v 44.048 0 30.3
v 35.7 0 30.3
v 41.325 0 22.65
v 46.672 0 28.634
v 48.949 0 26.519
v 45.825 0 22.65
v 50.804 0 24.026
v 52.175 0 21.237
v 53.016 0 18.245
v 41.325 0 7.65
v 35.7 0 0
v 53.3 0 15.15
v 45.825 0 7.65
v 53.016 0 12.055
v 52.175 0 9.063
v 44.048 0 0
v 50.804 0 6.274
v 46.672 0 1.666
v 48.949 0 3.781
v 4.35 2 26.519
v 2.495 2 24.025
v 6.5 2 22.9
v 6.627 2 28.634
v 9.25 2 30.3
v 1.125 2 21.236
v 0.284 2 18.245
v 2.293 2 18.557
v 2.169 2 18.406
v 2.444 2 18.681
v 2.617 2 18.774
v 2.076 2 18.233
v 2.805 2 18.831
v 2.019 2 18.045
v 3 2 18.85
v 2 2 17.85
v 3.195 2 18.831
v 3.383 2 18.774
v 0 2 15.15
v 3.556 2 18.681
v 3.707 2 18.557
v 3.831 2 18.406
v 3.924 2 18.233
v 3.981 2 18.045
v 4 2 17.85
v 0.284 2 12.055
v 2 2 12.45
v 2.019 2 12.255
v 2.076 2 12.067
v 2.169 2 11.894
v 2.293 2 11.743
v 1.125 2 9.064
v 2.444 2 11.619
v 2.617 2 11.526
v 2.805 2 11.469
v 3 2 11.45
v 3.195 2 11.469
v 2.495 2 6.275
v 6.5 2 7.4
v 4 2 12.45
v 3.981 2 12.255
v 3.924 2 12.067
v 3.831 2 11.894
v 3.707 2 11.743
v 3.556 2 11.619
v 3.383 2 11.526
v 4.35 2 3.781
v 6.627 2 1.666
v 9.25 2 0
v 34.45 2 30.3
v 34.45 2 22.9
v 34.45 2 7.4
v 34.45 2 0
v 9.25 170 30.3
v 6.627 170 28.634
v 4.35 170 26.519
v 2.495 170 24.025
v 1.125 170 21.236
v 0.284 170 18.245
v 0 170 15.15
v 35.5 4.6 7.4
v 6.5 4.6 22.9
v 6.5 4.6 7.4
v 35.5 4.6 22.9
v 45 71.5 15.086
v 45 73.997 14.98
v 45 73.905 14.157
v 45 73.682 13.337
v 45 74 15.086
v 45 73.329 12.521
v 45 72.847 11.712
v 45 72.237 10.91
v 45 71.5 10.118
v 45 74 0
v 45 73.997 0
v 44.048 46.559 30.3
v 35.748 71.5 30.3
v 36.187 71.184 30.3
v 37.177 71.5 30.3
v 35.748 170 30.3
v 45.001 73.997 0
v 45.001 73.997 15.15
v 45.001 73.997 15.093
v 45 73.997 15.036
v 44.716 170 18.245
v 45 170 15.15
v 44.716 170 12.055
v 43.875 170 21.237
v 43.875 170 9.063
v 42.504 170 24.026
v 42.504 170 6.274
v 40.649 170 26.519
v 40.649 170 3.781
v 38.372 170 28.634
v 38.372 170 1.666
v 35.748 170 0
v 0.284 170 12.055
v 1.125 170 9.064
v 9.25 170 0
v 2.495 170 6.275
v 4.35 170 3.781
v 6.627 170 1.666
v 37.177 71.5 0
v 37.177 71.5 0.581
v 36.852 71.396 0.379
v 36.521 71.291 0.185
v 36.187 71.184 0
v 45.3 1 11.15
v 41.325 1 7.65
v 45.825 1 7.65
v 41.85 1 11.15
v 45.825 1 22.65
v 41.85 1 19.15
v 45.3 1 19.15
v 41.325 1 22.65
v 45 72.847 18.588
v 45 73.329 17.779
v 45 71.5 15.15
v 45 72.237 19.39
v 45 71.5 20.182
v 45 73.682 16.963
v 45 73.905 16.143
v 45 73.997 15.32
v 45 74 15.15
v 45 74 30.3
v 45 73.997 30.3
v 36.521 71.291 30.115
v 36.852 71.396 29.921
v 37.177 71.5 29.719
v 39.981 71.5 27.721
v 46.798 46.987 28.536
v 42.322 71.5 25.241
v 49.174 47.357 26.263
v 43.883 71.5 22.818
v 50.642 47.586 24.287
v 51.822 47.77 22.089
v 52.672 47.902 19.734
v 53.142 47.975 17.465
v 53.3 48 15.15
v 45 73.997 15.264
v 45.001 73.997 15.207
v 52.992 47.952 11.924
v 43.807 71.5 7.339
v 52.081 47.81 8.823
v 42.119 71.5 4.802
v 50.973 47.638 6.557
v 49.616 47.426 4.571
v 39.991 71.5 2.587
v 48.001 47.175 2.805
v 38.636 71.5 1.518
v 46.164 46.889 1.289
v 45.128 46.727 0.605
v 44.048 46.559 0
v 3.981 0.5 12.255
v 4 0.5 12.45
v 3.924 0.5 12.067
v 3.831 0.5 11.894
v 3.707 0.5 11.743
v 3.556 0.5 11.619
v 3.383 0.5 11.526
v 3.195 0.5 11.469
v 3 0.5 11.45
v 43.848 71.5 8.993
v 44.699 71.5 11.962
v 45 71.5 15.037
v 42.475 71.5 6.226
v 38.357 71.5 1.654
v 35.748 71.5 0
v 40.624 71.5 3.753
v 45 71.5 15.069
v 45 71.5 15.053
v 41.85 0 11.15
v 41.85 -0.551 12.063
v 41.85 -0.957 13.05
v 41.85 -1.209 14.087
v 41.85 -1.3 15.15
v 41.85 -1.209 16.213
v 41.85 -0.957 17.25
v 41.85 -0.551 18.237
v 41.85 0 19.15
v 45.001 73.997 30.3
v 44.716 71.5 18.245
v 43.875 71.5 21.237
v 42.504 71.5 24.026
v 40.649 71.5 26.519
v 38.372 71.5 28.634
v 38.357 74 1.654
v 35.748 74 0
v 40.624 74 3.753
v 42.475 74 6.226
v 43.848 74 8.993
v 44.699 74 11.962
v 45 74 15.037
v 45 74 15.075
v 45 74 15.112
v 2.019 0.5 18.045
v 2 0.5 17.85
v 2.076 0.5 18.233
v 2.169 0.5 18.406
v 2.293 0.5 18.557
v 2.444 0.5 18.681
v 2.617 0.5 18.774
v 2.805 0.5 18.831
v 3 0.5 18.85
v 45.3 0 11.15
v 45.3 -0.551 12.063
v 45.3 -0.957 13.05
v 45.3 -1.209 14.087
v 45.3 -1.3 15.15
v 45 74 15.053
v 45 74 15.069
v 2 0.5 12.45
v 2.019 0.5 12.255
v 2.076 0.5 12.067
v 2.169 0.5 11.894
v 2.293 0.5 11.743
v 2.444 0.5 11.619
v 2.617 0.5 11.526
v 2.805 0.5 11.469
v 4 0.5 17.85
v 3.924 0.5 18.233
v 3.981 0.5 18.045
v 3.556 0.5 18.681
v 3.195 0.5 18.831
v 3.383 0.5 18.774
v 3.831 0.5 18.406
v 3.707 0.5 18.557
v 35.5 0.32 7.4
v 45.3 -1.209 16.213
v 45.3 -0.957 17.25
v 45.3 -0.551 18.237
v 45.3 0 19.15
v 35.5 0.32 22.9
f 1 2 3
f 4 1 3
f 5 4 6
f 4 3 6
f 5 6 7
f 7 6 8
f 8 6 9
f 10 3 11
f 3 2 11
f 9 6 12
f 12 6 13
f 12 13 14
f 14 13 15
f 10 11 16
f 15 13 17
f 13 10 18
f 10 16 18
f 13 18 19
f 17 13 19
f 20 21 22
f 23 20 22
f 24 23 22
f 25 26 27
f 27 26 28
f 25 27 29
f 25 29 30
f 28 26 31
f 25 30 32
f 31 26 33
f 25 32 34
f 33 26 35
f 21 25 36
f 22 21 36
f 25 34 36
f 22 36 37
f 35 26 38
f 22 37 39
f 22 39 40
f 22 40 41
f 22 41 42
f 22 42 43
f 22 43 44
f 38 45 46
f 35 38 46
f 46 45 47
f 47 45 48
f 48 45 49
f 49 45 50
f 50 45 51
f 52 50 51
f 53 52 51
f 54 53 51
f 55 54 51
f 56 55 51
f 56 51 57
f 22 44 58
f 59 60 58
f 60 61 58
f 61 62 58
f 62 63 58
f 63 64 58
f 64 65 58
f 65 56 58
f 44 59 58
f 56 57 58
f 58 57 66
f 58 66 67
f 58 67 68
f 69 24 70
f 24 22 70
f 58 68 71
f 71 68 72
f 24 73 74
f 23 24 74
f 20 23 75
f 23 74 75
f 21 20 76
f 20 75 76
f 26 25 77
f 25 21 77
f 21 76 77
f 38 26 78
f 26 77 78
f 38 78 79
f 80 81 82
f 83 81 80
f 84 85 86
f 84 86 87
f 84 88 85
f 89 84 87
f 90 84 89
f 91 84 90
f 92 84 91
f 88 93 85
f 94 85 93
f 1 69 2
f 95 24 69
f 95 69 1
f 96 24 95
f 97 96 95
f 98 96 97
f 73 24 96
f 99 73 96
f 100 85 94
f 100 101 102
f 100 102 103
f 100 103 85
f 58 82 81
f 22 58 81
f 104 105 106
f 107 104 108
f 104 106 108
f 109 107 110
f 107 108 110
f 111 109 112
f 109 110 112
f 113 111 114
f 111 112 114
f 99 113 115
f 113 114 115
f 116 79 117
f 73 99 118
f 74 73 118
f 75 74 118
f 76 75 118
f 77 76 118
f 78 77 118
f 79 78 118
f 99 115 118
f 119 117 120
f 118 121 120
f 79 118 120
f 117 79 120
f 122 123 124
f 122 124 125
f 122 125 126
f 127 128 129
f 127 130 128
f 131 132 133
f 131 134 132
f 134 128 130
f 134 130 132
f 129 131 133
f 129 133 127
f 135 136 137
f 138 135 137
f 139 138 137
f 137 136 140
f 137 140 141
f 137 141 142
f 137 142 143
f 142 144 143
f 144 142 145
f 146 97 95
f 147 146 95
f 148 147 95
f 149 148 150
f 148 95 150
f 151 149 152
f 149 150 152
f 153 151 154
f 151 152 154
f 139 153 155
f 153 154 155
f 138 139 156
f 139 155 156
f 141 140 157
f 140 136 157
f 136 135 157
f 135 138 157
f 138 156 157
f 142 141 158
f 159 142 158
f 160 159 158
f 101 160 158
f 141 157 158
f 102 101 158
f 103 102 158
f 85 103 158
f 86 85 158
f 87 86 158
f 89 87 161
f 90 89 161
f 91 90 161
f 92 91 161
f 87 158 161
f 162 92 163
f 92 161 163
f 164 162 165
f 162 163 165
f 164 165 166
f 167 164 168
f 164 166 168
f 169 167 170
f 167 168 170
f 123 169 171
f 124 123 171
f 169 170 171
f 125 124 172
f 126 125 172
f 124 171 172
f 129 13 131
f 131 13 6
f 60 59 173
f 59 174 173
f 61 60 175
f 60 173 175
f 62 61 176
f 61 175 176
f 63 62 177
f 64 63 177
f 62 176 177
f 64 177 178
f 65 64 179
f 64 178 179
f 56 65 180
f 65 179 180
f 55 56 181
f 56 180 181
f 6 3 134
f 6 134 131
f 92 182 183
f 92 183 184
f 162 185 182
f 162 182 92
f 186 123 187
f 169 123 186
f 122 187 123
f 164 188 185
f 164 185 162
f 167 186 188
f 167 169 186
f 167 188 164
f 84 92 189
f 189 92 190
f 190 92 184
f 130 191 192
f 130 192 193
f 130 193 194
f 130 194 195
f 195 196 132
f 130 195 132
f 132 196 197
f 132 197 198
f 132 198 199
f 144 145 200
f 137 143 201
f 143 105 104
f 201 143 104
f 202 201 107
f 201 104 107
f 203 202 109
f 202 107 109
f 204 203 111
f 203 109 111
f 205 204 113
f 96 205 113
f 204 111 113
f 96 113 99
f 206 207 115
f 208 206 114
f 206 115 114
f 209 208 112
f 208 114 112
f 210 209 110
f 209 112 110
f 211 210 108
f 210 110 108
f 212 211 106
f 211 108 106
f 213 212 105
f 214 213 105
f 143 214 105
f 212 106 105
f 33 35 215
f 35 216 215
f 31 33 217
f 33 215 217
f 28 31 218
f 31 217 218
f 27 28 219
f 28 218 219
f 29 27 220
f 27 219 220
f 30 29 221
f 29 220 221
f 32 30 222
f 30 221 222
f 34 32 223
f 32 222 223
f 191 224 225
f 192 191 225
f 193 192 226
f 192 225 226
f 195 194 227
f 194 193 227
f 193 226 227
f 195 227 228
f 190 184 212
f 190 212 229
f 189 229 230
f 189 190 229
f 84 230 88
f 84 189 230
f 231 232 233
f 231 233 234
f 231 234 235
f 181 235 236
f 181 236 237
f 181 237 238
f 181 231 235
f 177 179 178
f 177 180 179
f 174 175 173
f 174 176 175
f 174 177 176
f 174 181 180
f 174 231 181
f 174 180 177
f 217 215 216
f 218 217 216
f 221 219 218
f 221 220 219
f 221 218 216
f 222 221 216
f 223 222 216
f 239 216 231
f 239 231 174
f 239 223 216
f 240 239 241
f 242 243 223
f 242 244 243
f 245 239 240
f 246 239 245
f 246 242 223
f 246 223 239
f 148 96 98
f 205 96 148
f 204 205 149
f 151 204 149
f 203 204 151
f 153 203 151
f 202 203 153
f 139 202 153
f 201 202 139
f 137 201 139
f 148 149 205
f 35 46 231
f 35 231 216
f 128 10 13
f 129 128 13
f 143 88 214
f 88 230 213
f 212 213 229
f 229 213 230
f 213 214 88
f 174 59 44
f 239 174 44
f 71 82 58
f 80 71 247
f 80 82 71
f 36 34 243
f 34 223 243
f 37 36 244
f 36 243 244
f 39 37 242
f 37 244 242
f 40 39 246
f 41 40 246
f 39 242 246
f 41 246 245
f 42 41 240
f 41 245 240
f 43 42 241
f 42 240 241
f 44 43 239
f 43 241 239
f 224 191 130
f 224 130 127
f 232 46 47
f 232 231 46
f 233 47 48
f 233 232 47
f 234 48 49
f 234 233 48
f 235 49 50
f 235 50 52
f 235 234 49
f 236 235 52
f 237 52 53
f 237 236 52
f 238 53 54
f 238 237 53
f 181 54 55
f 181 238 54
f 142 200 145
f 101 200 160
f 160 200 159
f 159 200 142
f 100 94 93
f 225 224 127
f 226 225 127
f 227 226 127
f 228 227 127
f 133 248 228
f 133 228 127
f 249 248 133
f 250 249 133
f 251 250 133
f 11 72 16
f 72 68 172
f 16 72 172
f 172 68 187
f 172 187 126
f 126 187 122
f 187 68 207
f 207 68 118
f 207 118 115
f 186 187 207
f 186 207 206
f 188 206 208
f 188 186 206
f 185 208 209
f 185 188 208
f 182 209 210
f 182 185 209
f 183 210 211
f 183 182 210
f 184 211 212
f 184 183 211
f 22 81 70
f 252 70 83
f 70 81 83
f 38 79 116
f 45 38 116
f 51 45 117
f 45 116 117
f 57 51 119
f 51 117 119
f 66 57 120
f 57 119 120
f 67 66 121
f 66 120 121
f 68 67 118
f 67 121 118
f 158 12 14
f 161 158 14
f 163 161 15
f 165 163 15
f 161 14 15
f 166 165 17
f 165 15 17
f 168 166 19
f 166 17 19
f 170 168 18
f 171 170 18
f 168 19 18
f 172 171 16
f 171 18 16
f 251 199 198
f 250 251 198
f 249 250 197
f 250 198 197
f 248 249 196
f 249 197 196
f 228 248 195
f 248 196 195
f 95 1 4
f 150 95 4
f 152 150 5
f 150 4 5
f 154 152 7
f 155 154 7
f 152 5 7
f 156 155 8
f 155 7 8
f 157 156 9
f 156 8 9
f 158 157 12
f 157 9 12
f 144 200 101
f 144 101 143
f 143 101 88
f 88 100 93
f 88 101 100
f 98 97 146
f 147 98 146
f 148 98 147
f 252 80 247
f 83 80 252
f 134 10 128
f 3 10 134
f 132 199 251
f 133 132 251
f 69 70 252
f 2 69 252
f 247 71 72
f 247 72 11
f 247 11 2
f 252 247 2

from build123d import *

# Parameters (mm, degrees)
BOSS_EXTRUDE1_DEPTH      = 30.3
CUT_EXTRUDE1_DEPTH       = 181.717957049
CUT_EXTRUDE7_DEPTH       = 27.29
CUT_EXTRUDE10_DEPTH      = 96
CUT_EXTRUDE11_DEPTH      = 48
SKETCH9_W                = 2
SKETCH9_H                = 7.4
BOSS_EXTRUDE2_DEPTH      = 1.5
FILLET8_R                = 1
CUT_EXTRUDE15_DEPTH      = 2.6
CUT_EXTRUDE15_DEPTH_BACK = 2.6
SKETCH10_W               = 29
SKETCH10_H               = 15.5
SKETCH11_W               = 3.45
SKETCH11_H               = 8
BOSS_EXTRUDE3_DEPTH      = 1.3
FILLET9_R                = 7
CUT_EXTRUDE18_DEPTH      = 2.5
CUT_EXTRUDE23_START      = -2.5
CUT_EXTRUDE23_DEPTH      = 2.5
SKETCH18_W               = 4.5
SKETCH18_H               = 15
SKETCH18_W_2             = 3.45
SKETCH18_H_2             = 8
CUT_EXTRUDE24_DEPTH      = 1


# Read off the part's stored shape, not the designer's step: Cut-Extrude23
# Some blends are built 0.0001 mm under size
with BuildPart() as part:
    # Sketch1 → Boss-Extrude1 (new body)
    with BuildSketch(Plane.XY):
        Polygon((34.45, 2), (35.7, 0), (53.3, 0), (53.3, 48), (45, 74), (45, 170), (0, 170), (0, 2), align=None)
    extrude(amount=BOSS_EXTRUDE1_DEPTH)

    # Sketch2 → Cut-Extrude1 (cut, through all)
    with BuildSketch(Plane(origin=(0, 170, 0), x_dir=(1, 0, 0), z_dir=(0, 1, 0))):
        with BuildLine():
            Line((0, -30.3), (9.25, -30.3))
            ThreePointArc((9.25, -30.3), (2.495291793, -24.025316905), (0, -15.150000022))
            Line((0, -15.150000022), (0, -30.3))
        make_face()
        with BuildLine():
            ThreePointArc((0, -15.150000022), (2.495291781, -6.274683113), (9.25, 0))
            Line((9.25, 0), (0, 0))
            Line((0, 0), (0, -15.150000022))
        make_face()
    extrude(amount=-CUT_EXTRUDE1_DEPTH, mode=Mode.SUBTRACT)

    # Sketch7 → Cut-Extrude7 (cut)
    with BuildSketch(Plane(origin=(-8.97657775, 28.11940018, 0), x_dir=(0, 0, -1), z_dir=(0.30411092373144827, -0.9526366285563479, 0))):
        with BuildLine():
            Line((-15.15, 65.372856641), (-30.3, 65.372856641))
            Line((-30.3, 65.372856641), (-30.3, 56.120928382))
            ThreePointArc((-30.3, 56.120928382), (-24.02581935, 62.876979624), (-15.15, 65.372856641))
        make_face()
        with BuildLine():
            Line((0, 65.372856641), (-15.15, 65.372856641))
            ThreePointArc((-15.15, 65.372856641), (-6.27418065, 62.876979624), (0, 56.120928382))
            Line((0, 56.120928382), (0, 65.372856641))
        make_face()
    extrude(amount=-CUT_EXTRUDE7_DEPTH, mode=Mode.SUBTRACT)

    # Sketch6 → Cut-Extrude10 (cut)
    with BuildSketch(Plane(origin=(0, 170, 0), x_dir=(1, 0, 0), z_dir=(0, 1, 0))):
        with BuildLine():
            Line((45, -15.15), (45, 0))
            Line((45, 0), (35.74807174, 0))
            ThreePointArc((35.74807174, 0), (42.504122982, -6.27418065), (45, -15.15))
        make_face()
        with BuildLine():
            Line((45, -30.3), (45, -15.15))
            ThreePointArc((45, -15.15), (42.504122982, -24.02581935), (35.74807174, -30.3))
            Line((35.74807174, -30.3), (45, -30.3))
        make_face()
    extrude(amount=-CUT_EXTRUDE10_DEPTH, mode=Mode.SUBTRACT)

    # Sketch4 → Cut-Extrude11 (cut)
    with BuildSketch(Plane.XZ):
        with BuildLine():
            Line((53.3, 15.15), (53.3, 30.3))
            Line((53.3, 30.3), (44.04807174, 30.3))
            ThreePointArc((44.04807174, 30.3), (50.804122982, 24.02581935), (53.3, 15.15))
        make_face()
        with BuildLine():
            Line((53.3, 0), (53.3, 15.15))
            ThreePointArc((53.3, 15.15), (50.804122982, 6.27418065), (44.04807174, 0))
            Line((44.04807174, 0), (53.3, 0))
        make_face()
    extrude(amount=-CUT_EXTRUDE11_DEPTH, mode=Mode.SUBTRACT)

    # Sketch9 → Boss-Extrude2 (add)
    with BuildSketch(Plane.XZ.offset(-2)):
        with Locations((3, 15.15)):
            Rectangle(SKETCH9_W, SKETCH9_H)
    extrude(amount=BOSS_EXTRUDE2_DEPTH)

    # Fillet8
    fillet8_edges = [part.edges().sort_by_distance(p)[0] for p in [
        (4, 1.25, 11.45),
        (2, 1.25, 11.45),
        (4, 1.25, 18.85),
        (2, 1.25, 18.85),
    ]]
    fillet(fillet8_edges, radius=FILLET8_R - 0.0001)  # a hair under: the kernel refuses the full size

    # Sketch10 → Cut-Extrude15 (cut, two sides: drawn at the far end of the back side and taken through both)
    with BuildSketch(Plane.XZ.offset(-2).offset(-CUT_EXTRUDE15_DEPTH_BACK)):
        with Locations((21, 15.15)):
            Rectangle(SKETCH10_W, SKETCH10_H)
    extrude(amount=CUT_EXTRUDE15_DEPTH + CUT_EXTRUDE15_DEPTH_BACK, mode=Mode.SUBTRACT)

    # Sketch11 → Boss-Extrude3 (add)
    with BuildSketch(Plane.XZ):
        with Locations((43.575, 15.15)):
            Rectangle(SKETCH11_W, SKETCH11_H)
    extrude(amount=BOSS_EXTRUDE3_DEPTH)

    # Fillet9
    # the kernel refuses this fillet: 7 mm, written as the material it takes off along each edge
    with BuildSketch(Plane(origin=(55.458124827, -1.3, 11.15), x_dir=(0, 1, 0), z_dir=(-1, 0, 0)), Plane(origin=(31.691875173, -1.3, 19.15), x_dir=(0, 1, 0), z_dir=(1, 0, 0))) as fillet9_piece_1:
        with BuildLine():
            CenterArc((7, -4.063249931), FILLET9_R, 144.516796045, 35.483203955)
            Line((0, -4.063249931), (-0.14, -4.063249931))
            Line((-0.14, -4.063249931), (-0.14, 0))
            Line((-0.14, 0), (0, 0.14))
            ThreePointArc((0, 0.14), (0.65, 0.14), (1.186, 0.081264999))
            Line((1.186, 0.081264999), (1.3, 0))
        make_face()
    extrude(amount=23.766249654, mode=Mode.SUBTRACT)

    # Sketch13 → Cut-Extrude18 (cut)
    with BuildSketch(Plane(origin=(0, 74, 0), x_dir=(1, 0, 0), z_dir=(0, 1, 0))):
        with BuildLine():
            Line((35.74807174, -30.3), (45, -30.3))
            Line((45, -30.3), (45, -15.15))
            ThreePointArc((45, -15.15), (42.504122982, -24.02581935), (35.74807174, -30.3))
        make_face()
    extrude(amount=-CUT_EXTRUDE18_DEPTH, mode=Mode.SUBTRACT)

    # Cut-Extrude23 outline → Cut-Extrude23 (cut)
    with BuildSketch(Plane(origin=(0, 74, 0), x_dir=(1, 0, 0), z_dir=(0, 1, 0)).offset(CUT_EXTRUDE23_START)):
        with BuildLine():
            ThreePointArc((44.999624541, -15.036915931), (44.999829684, -15.061319249), (45, -15.085722835))
            Line((45, -15.085722835), (45, 0))
            Line((45, 0), (35.74807174, 0))
            ThreePointArc((35.74807174, 0), (42.474573722, -6.225973939), (44.999624541, -15.036915931))
        make_face()
    extrude(amount=CUT_EXTRUDE23_DEPTH, mode=Mode.SUBTRACT)

    # Sketch18 → Cut-Extrude24 (cut)
    with BuildSketch(Plane.XZ):
        with Locations((43.575, 15.15)):
            Rectangle(SKETCH18_W, SKETCH18_H)
        with Locations((43.575, 15.15)):
            Rectangle(SKETCH18_W_2, SKETCH18_H_2, mode=Mode.SUBTRACT)
    extrude(amount=-CUT_EXTRUDE24_DEPTH, mode=Mode.SUBTRACT)


solid = part.part
